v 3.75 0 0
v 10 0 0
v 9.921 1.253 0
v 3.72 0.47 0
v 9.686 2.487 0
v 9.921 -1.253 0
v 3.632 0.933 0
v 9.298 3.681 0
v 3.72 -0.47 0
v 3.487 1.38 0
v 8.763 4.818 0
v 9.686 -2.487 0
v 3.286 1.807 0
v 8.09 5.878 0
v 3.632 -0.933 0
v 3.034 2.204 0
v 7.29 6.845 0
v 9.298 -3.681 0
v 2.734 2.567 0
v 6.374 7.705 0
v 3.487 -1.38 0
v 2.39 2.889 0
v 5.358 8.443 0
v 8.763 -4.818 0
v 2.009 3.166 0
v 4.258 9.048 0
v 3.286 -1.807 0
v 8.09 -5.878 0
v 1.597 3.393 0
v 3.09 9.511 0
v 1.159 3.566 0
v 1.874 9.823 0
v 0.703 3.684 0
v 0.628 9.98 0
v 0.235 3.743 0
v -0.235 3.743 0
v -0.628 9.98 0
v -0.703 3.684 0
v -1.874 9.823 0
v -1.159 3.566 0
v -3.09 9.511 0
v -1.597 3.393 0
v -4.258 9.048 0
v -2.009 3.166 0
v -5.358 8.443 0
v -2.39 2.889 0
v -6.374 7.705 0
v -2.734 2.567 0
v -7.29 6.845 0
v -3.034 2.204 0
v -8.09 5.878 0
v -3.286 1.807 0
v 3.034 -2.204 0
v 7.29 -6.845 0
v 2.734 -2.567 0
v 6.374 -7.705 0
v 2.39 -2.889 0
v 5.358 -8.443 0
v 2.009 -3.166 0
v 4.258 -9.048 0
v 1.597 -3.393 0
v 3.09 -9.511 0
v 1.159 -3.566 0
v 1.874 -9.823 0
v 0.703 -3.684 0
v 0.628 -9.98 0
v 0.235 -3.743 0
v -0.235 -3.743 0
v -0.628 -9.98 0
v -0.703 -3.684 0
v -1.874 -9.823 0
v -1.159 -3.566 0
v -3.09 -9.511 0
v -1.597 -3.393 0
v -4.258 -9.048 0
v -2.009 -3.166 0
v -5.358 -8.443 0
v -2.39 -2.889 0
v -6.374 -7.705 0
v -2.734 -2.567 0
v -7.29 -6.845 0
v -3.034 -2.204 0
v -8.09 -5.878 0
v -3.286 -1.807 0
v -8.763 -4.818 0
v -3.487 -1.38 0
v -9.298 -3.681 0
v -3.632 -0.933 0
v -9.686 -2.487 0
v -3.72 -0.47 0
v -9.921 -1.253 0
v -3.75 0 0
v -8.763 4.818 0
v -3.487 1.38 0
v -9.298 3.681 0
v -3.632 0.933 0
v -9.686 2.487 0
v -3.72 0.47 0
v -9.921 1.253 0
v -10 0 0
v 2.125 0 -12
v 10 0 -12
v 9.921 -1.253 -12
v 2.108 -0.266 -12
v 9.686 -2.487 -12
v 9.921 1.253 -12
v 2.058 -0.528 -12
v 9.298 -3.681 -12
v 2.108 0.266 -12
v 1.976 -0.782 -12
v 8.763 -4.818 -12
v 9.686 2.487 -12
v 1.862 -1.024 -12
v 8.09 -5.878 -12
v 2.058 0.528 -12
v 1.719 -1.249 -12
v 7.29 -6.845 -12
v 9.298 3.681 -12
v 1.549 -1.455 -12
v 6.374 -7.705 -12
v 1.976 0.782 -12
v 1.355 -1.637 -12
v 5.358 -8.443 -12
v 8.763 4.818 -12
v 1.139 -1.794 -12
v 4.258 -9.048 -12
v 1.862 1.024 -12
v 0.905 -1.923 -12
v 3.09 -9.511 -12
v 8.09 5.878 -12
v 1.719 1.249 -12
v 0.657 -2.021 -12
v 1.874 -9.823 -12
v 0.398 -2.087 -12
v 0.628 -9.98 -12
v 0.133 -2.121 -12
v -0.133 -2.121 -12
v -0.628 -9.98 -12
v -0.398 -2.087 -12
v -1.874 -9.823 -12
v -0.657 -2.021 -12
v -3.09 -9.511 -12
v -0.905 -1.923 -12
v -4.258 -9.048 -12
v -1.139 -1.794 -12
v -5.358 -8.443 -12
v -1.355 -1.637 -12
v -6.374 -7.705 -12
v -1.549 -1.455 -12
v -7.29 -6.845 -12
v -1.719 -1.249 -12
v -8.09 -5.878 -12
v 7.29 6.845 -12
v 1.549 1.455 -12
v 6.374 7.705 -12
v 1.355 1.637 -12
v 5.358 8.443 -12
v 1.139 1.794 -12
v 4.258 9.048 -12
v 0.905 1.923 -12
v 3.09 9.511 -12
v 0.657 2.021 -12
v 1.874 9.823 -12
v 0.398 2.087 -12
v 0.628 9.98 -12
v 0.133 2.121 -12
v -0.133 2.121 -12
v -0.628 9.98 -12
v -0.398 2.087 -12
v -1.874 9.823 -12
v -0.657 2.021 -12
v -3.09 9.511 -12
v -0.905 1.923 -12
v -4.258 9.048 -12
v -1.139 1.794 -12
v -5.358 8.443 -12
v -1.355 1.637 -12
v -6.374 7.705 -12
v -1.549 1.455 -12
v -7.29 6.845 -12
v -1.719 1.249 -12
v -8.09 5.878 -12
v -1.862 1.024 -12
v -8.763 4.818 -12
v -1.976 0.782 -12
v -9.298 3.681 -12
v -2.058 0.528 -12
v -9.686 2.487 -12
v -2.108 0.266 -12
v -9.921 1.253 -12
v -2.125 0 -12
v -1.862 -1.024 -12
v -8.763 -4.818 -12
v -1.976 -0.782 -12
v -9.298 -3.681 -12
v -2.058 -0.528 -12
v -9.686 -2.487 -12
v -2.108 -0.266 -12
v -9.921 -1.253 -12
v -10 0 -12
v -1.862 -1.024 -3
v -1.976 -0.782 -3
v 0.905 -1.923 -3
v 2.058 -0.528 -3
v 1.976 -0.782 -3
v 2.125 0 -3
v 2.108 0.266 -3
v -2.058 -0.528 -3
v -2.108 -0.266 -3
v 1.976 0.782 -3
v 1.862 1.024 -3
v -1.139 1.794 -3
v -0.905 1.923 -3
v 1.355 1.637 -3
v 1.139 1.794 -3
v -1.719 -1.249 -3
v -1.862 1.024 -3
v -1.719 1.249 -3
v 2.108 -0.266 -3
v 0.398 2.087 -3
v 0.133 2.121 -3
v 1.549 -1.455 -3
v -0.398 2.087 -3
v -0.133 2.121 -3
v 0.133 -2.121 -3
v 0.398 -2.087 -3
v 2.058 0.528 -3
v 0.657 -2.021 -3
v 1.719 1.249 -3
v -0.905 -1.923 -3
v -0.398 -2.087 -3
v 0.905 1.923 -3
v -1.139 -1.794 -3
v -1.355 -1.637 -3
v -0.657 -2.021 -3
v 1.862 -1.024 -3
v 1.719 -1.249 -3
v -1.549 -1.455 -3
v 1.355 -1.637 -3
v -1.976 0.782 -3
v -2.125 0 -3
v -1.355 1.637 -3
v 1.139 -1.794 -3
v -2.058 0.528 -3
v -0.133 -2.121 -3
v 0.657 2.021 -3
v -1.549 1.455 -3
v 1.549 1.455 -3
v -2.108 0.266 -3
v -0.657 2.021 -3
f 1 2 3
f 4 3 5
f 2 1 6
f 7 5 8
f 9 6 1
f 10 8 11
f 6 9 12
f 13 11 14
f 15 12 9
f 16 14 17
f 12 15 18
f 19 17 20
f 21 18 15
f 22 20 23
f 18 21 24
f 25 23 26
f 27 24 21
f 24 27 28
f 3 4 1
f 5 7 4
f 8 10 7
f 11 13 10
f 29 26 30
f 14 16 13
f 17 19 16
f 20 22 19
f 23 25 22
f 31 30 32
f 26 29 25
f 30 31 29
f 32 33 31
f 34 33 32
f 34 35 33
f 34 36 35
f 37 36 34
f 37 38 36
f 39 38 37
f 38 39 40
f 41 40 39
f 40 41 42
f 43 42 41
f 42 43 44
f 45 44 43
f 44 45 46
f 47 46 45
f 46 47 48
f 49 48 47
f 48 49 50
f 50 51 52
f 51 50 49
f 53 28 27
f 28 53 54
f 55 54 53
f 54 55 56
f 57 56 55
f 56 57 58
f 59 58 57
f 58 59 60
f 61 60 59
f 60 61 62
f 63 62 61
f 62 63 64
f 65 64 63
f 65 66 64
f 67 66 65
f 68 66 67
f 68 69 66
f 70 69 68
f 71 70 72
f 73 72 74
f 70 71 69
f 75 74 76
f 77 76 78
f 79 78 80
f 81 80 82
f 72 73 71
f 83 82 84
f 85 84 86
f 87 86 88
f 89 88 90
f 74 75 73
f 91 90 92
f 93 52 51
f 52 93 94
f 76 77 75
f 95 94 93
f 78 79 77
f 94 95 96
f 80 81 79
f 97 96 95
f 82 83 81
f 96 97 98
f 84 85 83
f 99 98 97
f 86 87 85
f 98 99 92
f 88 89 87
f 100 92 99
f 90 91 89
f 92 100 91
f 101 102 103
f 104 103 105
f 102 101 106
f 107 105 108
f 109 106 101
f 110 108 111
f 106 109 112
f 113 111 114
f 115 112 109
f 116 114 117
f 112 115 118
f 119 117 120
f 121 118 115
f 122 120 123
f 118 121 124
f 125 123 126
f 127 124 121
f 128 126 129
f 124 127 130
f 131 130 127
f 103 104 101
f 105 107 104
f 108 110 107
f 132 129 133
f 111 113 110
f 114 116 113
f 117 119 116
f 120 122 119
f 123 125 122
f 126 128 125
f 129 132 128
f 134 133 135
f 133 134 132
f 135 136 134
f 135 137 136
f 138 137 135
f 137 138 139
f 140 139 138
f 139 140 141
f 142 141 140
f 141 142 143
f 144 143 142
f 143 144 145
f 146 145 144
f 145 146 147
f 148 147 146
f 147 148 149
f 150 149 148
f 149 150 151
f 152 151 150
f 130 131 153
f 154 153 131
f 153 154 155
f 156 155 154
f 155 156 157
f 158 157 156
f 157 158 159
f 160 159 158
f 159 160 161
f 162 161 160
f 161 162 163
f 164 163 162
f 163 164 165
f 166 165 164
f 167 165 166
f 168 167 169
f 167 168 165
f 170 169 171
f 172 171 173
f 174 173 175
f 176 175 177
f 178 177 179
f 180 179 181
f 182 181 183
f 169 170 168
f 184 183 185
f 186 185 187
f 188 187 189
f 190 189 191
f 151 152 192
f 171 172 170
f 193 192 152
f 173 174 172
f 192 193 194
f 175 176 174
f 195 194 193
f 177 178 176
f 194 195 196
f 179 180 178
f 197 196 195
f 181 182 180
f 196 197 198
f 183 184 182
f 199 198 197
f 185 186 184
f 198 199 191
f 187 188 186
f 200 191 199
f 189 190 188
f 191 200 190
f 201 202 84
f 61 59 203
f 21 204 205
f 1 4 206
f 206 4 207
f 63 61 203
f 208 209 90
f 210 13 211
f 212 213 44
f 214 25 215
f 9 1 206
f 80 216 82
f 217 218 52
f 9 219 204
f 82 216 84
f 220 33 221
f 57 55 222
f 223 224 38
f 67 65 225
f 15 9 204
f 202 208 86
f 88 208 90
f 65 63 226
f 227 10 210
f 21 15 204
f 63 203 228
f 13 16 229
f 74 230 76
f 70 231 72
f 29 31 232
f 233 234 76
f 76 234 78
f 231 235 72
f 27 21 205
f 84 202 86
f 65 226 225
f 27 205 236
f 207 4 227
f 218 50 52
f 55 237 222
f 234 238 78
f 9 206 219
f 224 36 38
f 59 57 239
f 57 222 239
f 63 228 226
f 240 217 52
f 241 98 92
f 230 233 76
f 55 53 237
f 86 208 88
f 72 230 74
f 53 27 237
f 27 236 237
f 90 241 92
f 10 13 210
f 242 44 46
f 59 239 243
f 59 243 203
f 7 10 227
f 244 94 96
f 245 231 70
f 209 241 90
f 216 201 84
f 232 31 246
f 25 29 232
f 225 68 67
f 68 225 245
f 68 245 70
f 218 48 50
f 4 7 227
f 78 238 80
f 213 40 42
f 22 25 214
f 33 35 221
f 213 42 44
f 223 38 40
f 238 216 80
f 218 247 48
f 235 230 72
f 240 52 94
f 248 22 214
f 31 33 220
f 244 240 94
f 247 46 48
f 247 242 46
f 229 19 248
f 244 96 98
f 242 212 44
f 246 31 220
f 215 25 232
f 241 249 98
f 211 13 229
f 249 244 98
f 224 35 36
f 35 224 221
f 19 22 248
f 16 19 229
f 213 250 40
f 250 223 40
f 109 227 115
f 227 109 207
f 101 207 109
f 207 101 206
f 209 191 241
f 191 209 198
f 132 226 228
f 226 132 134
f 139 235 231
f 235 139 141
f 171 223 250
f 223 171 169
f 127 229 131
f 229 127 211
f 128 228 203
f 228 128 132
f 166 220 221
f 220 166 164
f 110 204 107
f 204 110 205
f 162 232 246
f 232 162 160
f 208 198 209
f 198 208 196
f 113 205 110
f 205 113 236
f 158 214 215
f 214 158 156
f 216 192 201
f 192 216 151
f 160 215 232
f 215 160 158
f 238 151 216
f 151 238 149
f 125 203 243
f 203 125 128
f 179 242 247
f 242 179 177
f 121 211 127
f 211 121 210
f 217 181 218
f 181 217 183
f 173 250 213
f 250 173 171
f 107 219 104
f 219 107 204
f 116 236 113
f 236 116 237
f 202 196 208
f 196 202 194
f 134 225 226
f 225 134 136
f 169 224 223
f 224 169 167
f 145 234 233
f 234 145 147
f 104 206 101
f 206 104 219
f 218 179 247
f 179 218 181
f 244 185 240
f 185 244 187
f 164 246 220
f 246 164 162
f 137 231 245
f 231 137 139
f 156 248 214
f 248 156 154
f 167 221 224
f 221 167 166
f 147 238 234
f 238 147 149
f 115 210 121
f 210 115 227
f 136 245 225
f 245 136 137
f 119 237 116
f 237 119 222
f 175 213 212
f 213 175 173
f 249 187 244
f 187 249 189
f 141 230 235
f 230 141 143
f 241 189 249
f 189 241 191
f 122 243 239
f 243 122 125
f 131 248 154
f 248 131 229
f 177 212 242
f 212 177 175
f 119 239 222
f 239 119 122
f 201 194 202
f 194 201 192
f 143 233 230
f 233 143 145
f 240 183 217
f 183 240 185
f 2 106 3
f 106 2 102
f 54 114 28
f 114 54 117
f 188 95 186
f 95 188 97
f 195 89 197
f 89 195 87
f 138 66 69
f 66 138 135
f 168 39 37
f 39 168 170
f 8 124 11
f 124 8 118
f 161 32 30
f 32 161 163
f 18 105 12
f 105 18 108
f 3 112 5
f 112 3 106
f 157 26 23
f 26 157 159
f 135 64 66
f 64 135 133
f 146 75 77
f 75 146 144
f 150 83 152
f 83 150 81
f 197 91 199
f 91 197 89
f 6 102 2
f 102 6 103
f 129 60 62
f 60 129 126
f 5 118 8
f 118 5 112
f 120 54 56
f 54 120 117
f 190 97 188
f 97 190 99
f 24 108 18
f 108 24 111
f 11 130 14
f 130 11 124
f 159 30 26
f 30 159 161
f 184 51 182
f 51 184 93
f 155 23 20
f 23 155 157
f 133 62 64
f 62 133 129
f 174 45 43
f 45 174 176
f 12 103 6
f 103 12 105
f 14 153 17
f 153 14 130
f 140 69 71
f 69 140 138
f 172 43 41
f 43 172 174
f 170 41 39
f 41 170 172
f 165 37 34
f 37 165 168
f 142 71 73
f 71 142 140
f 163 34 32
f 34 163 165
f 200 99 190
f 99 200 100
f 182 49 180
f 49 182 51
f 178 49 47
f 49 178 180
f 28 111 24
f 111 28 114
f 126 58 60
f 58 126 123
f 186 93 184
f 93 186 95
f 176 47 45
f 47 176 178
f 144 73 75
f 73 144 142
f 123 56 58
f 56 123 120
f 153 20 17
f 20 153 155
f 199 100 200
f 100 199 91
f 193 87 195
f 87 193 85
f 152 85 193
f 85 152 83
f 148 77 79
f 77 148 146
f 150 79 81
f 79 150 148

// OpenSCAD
$fn = 50;


difference() {
	union() {
		translate(v = [0, 0, -12.0000000000]) {
			cylinder(h = 12, r = 10.0000000000);
		}
		cylinder(h = 0, r = 19.0000000000);
	}
	union() {
		translate(v = [0, 0, 0]) {
			rotate(a = [0, 0, 0]) {
				difference() {
					union() {
						#translate(v = [0, 0, -12.0000000000]) {
							cylinder(h = 12, r = 2.0000000000);
						}
						#translate(v = [0, 0, -3]) {
							cylinder(h = 3, r = 10.0000000000, r1 = 2.1250000000, r2 = 3.7500000000);
						}
						#translate(v = [0, 0, -12.0000000000]) {
							cylinder(h = 12, r = 2.1250000000);
						}
						#translate(v = [0, 0, -12.0000000000]) {
							cylinder(h = 12, r = 2.0000000000);
						}
					}
					union();
				}
			}
		}
	}
}
